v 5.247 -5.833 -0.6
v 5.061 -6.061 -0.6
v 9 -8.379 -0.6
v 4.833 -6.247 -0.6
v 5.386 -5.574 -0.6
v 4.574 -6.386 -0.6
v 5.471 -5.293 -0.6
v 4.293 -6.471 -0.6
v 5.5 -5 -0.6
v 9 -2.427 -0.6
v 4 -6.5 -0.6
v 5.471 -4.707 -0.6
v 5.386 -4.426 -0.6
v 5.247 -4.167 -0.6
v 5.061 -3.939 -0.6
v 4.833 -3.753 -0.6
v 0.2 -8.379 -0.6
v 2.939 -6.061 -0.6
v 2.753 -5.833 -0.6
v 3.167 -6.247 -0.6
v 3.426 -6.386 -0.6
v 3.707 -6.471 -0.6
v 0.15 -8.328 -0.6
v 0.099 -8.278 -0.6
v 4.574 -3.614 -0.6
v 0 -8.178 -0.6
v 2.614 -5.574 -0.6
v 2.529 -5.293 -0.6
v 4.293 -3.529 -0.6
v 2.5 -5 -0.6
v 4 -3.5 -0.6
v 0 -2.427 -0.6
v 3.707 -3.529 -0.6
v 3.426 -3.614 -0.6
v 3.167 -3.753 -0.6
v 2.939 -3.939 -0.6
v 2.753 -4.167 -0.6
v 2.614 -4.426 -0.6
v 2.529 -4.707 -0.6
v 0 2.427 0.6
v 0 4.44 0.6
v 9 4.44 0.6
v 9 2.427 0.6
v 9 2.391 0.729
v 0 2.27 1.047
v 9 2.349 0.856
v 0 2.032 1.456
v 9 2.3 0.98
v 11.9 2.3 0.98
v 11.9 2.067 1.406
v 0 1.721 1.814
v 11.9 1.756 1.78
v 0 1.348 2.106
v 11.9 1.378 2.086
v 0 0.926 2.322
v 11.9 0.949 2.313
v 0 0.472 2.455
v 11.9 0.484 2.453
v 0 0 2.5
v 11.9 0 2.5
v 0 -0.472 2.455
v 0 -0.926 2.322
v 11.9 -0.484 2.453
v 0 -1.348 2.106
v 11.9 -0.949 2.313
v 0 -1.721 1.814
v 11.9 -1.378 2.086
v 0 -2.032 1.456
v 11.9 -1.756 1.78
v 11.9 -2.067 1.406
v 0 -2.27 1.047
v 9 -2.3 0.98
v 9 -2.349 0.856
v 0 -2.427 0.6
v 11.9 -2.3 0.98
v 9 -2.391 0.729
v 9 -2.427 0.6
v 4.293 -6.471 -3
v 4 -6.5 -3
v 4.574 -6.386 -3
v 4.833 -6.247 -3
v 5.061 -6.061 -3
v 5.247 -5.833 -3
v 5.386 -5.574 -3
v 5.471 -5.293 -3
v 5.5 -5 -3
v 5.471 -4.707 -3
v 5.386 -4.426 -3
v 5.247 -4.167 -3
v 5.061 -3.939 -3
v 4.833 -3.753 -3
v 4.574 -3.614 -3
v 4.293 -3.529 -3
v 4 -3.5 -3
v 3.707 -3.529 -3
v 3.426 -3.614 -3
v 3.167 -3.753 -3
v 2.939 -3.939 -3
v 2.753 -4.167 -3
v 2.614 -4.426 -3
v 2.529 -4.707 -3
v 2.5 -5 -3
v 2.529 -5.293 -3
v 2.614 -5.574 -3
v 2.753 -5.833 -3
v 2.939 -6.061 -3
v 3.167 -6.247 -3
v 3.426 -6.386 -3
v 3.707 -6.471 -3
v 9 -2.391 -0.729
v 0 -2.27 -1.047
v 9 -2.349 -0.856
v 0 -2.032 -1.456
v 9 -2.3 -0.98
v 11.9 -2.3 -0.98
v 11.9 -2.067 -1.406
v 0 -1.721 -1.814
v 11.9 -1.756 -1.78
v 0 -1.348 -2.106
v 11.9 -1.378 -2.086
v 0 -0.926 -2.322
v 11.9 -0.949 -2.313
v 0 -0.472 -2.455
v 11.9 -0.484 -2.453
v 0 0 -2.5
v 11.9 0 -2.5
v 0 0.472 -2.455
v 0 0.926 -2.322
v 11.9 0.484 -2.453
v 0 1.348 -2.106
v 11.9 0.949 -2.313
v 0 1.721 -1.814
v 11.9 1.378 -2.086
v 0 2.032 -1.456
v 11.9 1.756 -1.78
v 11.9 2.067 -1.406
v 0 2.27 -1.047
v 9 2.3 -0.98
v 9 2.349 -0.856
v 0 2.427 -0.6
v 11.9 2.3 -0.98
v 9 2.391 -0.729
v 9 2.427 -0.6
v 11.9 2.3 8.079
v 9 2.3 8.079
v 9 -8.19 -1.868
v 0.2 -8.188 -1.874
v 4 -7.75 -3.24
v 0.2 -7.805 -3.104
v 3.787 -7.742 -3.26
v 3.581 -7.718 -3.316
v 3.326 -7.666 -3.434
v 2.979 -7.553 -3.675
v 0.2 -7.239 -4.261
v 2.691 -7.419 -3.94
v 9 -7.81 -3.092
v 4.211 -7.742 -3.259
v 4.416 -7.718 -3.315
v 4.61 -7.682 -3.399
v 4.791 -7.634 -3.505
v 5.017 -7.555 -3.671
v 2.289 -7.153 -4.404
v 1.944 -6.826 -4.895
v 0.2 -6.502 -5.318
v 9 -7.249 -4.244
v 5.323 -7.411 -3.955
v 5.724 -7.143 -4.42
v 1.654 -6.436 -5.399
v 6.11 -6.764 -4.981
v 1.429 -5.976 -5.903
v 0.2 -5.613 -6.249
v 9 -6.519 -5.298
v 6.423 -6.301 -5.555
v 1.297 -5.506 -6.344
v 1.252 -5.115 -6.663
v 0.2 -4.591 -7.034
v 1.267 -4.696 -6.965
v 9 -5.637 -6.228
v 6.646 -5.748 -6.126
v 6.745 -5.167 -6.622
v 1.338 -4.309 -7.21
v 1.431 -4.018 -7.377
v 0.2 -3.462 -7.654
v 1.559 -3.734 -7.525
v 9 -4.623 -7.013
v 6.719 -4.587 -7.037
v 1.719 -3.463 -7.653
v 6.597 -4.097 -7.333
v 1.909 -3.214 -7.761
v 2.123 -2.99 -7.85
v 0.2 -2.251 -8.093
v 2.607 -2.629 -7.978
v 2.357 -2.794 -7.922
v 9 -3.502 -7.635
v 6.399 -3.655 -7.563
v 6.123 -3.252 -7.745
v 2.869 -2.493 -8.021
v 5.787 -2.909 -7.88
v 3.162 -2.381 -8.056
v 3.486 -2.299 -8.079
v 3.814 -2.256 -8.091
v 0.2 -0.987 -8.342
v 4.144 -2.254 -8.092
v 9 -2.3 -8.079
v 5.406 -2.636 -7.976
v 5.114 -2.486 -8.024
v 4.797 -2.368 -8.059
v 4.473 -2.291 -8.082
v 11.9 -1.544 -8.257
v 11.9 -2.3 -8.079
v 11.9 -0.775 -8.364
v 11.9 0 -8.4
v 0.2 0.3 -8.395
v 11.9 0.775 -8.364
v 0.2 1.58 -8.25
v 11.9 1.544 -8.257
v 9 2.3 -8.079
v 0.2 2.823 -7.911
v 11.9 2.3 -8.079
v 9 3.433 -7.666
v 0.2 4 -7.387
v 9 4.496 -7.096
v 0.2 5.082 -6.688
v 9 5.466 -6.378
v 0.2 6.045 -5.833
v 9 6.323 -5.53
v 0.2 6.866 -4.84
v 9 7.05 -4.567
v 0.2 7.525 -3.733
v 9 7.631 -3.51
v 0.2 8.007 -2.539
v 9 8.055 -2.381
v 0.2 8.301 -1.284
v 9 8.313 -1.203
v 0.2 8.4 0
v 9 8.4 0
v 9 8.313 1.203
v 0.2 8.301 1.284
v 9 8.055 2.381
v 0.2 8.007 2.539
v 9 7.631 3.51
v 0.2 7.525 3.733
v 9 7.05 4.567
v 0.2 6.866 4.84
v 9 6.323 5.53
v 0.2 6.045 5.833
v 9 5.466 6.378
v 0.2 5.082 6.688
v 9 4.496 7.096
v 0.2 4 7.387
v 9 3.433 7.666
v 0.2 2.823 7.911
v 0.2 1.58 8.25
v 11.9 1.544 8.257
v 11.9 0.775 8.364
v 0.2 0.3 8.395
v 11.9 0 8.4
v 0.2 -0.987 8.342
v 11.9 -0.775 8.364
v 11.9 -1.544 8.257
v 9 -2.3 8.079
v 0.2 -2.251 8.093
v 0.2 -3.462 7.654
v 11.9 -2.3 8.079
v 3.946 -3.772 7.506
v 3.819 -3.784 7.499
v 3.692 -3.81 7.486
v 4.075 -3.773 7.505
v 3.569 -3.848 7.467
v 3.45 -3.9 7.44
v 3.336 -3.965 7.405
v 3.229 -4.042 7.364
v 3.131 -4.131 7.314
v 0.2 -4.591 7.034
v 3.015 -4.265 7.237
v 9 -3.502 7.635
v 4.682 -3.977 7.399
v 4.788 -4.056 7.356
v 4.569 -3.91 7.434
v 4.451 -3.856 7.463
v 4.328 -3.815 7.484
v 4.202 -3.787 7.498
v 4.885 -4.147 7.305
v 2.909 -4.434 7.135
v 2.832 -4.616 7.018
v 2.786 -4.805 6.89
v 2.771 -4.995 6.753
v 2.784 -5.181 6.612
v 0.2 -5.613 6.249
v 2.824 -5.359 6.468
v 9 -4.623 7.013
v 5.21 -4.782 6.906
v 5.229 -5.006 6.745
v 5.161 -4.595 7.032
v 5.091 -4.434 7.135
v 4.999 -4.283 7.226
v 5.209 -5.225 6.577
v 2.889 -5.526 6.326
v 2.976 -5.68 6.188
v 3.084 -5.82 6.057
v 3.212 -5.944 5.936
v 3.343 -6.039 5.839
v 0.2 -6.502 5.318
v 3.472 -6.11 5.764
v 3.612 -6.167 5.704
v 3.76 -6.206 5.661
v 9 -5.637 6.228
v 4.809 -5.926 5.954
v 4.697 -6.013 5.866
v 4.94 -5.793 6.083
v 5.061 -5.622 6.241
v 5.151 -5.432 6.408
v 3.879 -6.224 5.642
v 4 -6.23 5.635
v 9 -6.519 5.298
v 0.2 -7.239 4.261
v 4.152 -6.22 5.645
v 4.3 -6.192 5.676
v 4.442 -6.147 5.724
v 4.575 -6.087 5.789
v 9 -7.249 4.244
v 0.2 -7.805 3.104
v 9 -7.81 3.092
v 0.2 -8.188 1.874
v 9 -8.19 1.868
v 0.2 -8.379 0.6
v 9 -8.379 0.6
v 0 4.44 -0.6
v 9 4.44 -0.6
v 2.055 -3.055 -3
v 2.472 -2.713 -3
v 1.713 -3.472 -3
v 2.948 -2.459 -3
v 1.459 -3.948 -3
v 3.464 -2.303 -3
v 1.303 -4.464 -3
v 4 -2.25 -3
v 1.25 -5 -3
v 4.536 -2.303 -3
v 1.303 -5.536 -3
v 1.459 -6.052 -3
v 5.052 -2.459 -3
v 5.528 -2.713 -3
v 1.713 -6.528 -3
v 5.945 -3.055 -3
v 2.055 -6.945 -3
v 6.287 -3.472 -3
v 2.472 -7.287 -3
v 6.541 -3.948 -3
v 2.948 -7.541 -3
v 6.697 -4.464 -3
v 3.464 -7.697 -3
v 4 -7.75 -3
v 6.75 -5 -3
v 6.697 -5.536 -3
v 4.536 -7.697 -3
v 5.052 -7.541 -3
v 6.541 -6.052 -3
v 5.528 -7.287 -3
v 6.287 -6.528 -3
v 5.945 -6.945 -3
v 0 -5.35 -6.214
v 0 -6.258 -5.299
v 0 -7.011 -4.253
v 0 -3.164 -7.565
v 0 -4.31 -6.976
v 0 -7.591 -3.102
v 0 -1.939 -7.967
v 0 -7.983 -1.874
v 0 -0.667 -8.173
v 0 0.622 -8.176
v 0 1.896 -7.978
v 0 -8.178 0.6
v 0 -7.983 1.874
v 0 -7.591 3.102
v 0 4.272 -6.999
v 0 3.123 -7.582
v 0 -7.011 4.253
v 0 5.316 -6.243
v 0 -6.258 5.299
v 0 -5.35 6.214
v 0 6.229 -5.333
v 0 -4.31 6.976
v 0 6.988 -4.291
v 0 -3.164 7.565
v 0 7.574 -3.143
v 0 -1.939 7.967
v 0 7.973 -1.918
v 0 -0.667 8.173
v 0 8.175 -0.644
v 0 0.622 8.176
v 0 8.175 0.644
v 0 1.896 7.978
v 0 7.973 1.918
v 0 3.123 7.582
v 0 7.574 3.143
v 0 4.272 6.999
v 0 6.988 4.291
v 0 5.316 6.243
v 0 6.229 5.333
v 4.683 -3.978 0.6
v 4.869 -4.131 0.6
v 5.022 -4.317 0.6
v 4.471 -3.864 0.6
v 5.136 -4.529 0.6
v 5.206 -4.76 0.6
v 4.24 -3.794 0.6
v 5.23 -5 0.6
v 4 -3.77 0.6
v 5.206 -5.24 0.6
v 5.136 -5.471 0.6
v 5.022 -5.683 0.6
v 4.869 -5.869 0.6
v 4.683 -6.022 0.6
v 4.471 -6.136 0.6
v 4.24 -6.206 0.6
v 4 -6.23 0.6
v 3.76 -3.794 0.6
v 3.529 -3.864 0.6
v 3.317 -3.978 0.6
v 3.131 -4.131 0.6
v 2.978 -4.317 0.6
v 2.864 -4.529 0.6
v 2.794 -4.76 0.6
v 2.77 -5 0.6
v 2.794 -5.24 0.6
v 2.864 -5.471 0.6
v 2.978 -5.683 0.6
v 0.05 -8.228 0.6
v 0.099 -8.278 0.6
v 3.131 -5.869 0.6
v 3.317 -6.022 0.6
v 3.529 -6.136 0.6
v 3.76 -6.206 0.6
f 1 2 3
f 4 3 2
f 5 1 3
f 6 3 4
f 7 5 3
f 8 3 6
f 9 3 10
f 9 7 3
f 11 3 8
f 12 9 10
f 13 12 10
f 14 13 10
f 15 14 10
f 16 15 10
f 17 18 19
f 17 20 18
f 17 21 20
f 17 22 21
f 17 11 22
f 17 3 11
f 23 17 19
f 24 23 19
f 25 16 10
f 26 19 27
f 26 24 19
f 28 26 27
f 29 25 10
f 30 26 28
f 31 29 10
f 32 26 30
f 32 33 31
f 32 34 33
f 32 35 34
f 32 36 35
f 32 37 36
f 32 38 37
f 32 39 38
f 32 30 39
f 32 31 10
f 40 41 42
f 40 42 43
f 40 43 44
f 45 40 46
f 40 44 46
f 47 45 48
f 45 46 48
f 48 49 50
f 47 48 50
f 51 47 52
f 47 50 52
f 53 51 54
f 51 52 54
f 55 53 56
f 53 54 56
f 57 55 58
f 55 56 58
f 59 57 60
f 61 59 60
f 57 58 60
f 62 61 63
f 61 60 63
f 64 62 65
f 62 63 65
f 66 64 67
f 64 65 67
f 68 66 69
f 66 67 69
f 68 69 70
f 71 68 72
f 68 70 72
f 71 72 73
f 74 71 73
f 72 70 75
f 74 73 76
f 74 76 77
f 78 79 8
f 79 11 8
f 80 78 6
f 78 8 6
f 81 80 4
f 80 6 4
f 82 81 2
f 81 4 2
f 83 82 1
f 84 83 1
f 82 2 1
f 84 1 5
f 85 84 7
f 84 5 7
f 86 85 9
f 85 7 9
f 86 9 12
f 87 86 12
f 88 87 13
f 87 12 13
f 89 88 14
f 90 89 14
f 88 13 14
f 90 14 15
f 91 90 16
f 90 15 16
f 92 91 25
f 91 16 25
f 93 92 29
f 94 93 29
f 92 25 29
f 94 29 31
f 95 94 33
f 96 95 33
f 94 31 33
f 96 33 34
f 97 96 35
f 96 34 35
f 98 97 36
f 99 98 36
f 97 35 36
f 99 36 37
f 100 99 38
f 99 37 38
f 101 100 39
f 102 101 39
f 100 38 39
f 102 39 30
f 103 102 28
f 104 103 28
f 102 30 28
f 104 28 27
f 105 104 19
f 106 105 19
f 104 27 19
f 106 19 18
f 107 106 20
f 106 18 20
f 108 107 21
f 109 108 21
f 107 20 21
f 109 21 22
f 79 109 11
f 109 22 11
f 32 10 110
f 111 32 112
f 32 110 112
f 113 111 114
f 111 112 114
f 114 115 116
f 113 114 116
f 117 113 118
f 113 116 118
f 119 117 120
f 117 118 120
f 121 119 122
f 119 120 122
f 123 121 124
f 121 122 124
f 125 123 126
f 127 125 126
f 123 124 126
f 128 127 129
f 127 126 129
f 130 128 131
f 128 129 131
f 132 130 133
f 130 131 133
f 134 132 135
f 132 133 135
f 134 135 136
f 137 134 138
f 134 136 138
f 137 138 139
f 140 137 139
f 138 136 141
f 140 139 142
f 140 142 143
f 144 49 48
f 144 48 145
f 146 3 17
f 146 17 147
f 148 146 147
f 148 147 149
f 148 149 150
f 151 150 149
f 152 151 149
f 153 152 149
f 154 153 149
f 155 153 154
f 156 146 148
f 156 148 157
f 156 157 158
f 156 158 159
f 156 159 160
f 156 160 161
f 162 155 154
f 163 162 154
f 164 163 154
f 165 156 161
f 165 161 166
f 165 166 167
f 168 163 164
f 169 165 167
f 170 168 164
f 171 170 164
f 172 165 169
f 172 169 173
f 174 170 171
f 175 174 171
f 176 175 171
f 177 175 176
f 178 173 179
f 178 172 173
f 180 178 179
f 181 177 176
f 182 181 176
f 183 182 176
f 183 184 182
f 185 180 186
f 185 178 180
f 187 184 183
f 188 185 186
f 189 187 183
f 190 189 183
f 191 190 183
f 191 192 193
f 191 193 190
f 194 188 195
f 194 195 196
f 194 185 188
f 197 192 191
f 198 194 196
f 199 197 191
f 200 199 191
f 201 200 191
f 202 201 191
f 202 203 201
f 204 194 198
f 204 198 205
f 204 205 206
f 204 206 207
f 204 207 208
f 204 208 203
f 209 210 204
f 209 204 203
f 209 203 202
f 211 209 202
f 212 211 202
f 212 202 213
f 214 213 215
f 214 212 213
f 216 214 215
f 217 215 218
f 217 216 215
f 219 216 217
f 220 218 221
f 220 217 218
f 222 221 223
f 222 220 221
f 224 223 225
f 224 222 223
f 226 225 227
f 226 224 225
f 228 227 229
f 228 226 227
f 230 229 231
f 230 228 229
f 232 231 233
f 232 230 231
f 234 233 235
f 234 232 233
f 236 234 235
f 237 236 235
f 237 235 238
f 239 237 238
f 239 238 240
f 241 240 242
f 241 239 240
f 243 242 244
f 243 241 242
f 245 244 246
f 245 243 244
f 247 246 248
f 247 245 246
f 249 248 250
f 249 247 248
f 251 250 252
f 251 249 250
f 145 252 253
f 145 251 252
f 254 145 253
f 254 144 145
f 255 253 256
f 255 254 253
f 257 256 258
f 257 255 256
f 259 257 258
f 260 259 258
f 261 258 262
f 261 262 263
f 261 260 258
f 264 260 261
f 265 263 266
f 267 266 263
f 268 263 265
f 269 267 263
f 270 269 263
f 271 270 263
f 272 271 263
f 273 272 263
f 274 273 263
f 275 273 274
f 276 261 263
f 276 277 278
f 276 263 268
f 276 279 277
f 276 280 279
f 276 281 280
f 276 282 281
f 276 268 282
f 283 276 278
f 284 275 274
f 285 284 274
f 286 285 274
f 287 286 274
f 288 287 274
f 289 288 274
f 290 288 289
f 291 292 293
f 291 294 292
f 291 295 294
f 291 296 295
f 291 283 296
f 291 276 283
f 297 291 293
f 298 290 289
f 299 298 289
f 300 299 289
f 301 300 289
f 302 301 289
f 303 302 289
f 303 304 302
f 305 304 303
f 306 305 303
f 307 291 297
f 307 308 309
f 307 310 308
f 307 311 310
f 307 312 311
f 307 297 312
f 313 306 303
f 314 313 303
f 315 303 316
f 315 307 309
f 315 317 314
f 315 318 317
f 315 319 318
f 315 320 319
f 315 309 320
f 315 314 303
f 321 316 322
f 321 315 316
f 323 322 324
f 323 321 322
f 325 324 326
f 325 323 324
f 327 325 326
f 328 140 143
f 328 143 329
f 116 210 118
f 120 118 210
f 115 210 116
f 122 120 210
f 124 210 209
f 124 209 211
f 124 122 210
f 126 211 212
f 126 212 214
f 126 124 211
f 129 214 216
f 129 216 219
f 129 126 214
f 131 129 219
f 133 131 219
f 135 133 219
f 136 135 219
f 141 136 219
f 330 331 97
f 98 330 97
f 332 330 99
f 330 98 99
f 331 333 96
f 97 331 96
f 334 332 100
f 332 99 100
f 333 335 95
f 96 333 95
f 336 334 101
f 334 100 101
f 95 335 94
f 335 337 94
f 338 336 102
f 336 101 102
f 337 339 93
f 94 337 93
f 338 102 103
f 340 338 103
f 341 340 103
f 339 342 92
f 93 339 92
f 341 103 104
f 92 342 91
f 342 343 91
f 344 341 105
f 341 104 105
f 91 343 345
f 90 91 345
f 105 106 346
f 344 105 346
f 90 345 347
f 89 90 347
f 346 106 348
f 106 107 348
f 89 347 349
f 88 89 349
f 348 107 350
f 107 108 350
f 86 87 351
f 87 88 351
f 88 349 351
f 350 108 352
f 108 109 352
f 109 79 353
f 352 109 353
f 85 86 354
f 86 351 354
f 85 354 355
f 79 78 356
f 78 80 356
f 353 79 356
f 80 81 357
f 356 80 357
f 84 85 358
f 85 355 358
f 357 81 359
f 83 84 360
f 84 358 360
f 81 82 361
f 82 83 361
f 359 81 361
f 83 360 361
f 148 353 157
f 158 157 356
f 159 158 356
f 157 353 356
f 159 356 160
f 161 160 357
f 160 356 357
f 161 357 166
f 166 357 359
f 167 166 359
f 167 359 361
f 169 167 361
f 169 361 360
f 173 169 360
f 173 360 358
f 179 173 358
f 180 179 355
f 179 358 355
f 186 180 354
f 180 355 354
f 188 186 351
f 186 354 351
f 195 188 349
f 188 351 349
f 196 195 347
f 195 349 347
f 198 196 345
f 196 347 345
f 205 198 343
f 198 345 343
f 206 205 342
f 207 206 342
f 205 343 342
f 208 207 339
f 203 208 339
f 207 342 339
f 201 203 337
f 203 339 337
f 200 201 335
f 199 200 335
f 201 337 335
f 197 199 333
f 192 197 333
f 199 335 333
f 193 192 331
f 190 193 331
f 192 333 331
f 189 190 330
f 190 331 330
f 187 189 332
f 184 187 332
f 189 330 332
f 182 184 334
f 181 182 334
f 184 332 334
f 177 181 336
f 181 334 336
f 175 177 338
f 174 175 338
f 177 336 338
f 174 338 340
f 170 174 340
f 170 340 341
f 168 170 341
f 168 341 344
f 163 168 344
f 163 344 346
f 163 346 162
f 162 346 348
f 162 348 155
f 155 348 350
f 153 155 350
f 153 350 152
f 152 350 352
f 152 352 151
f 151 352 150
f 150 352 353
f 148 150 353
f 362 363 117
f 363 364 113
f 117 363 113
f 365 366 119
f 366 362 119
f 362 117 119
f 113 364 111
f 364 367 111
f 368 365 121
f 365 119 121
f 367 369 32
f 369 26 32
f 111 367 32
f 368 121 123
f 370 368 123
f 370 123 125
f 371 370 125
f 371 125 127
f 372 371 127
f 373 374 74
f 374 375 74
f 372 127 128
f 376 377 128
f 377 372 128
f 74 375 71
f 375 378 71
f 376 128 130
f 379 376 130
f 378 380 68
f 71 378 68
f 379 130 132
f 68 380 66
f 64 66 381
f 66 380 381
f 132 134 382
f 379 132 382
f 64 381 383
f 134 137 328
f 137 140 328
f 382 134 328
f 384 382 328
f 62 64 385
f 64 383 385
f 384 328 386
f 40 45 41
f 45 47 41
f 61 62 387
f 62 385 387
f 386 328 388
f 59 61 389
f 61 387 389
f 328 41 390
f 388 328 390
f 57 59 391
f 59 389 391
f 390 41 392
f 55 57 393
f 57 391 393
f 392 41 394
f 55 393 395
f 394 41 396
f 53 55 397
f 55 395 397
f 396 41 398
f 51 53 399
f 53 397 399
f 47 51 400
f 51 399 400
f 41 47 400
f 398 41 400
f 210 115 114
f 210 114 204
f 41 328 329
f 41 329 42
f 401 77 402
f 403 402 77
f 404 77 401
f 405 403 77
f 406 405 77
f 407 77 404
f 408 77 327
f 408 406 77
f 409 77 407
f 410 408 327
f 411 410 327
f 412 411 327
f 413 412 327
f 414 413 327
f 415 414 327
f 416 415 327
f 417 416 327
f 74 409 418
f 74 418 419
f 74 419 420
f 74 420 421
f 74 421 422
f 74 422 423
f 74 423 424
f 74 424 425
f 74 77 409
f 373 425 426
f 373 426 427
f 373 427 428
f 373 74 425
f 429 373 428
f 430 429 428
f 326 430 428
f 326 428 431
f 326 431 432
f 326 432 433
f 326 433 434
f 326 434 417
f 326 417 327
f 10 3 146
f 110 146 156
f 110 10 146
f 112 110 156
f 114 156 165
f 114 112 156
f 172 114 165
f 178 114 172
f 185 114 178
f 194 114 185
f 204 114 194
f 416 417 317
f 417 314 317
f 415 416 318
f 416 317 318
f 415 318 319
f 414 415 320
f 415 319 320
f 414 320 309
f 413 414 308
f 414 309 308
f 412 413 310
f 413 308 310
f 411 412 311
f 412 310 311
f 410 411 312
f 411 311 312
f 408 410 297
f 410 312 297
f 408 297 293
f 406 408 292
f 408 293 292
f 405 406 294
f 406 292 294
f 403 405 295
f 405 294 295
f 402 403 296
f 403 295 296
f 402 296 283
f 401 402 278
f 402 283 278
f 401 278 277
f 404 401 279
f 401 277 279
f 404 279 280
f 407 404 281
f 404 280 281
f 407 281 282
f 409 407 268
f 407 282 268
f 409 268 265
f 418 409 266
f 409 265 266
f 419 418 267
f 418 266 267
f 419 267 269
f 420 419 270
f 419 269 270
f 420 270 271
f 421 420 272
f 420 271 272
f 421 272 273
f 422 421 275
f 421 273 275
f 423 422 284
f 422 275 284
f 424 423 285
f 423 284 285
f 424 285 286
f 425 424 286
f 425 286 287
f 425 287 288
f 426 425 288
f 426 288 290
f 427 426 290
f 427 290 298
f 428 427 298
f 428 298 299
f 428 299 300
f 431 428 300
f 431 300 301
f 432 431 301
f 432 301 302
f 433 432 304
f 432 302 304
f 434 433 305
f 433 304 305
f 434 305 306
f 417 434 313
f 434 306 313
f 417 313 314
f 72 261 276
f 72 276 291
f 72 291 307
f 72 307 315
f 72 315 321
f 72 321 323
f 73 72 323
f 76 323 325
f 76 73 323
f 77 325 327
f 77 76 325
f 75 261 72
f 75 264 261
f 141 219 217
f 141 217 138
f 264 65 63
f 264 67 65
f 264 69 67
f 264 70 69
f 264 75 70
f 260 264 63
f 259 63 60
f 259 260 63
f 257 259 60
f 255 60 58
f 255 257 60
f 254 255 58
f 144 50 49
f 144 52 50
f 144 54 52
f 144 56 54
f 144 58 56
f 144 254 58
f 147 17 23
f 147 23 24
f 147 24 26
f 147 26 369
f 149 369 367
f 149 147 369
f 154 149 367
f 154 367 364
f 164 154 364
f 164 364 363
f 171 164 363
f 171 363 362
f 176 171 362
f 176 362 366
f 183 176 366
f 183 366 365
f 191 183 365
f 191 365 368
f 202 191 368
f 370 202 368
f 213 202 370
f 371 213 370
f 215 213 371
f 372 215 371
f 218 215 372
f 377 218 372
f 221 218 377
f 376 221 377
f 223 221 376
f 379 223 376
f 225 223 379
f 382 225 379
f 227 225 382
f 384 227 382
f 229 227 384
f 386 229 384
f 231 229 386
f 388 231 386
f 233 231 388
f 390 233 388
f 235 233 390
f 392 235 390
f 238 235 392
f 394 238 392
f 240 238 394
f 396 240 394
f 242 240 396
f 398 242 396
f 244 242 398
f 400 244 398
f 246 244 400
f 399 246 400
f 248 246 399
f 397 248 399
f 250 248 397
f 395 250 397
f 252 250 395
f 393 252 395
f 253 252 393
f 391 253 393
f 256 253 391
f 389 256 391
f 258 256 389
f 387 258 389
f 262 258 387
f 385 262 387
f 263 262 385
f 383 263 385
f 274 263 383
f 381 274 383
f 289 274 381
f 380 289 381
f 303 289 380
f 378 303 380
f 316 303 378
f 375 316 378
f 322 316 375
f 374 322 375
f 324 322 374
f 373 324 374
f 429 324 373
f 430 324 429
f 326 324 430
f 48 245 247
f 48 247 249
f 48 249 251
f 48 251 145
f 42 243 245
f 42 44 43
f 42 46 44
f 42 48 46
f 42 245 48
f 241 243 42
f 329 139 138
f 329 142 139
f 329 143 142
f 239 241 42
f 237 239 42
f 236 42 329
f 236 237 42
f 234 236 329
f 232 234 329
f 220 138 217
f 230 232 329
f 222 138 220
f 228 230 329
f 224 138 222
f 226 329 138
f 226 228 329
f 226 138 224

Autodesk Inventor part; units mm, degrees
sketch "Sketch_1" plane through (0, 0, 0) normal (0, 0, 1) x (1, 0, 0)
  line L0 (11.9, 0) -> (0, 0)
  line L1 (0, 0) -> (0, 8.2)
  line L2 (0, 8.2) -> (0.2, 8.4)
  line L3 (0.2, 8.4) -> (11.9, 8.4)
  line L4 (11.9, 8.4) -> (11.9, 0)
  line L5 (11.9, 0) -> (0, 0)
revolve "Revolution1" add sketch "Sketch_1" angle 360 about axis through (11.9, 0, 0) along (1, 0, 0)
sketch "Sketch_6" plane through (0, 0, 0) normal (1, 0, 0) x (0, 1, 0)
  line L0 (0, 0.6) -> (-8.4, 0.6)
  line L1 (-8.4, 0.6) -> (-8.4, -0.6)
  line L2 (-8.4, -0.6) -> (0, -0.6)
  line L3 (0, -0.6) -> (0, 0.6)
extrude "Extrusion1" cut sketch "Sketch_6" along normal blind 9
sketch "Sketch_7" plane through (4, 0, 0) normal (1, 0, 0) x (0, 0, -1)
  line L0 (-8.4, -5) -> (8.4, -5)
  line L1 (8.4, -5) -> (8.4, -7.75)
  line L2 (8.4, -7.75) -> (3, -7.75)
  line L3 (3, -7.75) -> (3, -6.5)
  line L4 (3, -6.5) -> (0.6, -6.5)
  line L5 (0.6, -6.5) -> (0.6, -5)
  line L6 (0.6, -5) -> (8.4, -5)
revolve "Revolution2" cut sketch "Sketch_7" angle 360 about axis through (4, -5, 8.4) along (0, 0, 1)
sketch "Sketch_13" plane through (4, 0, 0) normal (1, 0, 0) x (0, 0, -1)
  line L0 (-8.4, -5) -> (8.4, -5)
  line L1 (-0.6, -5) -> (-0.6, -6.2295)
  line L2 (-0.6, -6.2295) -> (-8.4, -6.2295)
  line L3 (-8.4, -6.2295) -> (-8.4, -5)
  line L4 (-8.4, -5) -> (-0.6, -5)
revolve "Revolution3" cut sketch "Sketch_13" angle 360 about axis through (4, -5, 8.4) along (0, 0, 1)
thread "Thread1" size "M3x0.5" class "6H" standard "ISO Metric profile" length 4.7207 offset 2.1855
sketch "Sketch_2" plane through (11.9, 0, 0) normal (1, 0, 0) x (0, 0, -1)
  line L0 (-9.4, 8.9) -> (-9.4, -8.9)
  line L1 (-9.4, -8.9) -> (9.4, -8.9)
  line L2 (9.4, -8.9) -> (9.4, 8.9)
  line L3 (9.4, 8.9) -> (-9.4, 8.9)
  line L4 (-8.4, 2.3) -> (-8.4, -2.3)
  line L5 (-8.4, -2.3) -> (8.4, -2.3)
  line L6 (8.4, -2.3) -> (8.4, 2.3)
  line L7 (8.4, 2.3) -> (-8.4, 2.3)
extrude "Extrusion2" cut sketch "Sketch_2" against normal blind 2.9
sketch "Sketch_3" plane through (0, 0, 0) normal (0, 0, 1) x (1, 0, 0)
  line L0 (11.9, 0) -> (0, 0)
  line L1 (0, 0) -> (0, 2.5)
  line L2 (0, 2.5) -> (11.9, 2.5)
  line L3 (11.9, 2.5) -> (11.9, 0)
  line L4 (11.9, 0) -> (0, 0)
revolve "Revolution4" cut sketch "Sketch_3" angle 360 about axis through (11.9, 0, 0) along (1, 0, 0)
sketch "Sketch_17" plane through (0, 0, 0) normal (1, 0, 0) x (0, 0, -1)
  line L0 (-0.6, 0) -> (0.6, 0)
  line L1 (0.6, 0) -> (0.6, 4.44)
  line L2 (0.6, 4.44) -> (-0.6, 4.44)
  line L3 (-0.6, 4.44) -> (-0.6, 0)
extrude "Extrusion3" cut sketch "Sketch_17" along normal blind 11.9
ref_plane "L_XY" through (12.2, 0, 0) normal (1, 0, 0) x (0, 0, -1)
ref_plane "L_YZ" through (12.2, 0, 0) normal (0, 0, -1) x (0, 1, 0)
ref_plane "L_ZX" through (12.2, 0, 0) normal (0, 1, 0) x (1, 0, 0)
ref_plane "screw_XY" through (4, -5, -3) normal (0, 0, -1) x (1, 0, 0)
ref_plane "screw_YZ" through (4, -5, -3) normal (1, 0, 0) x (0, -1, 0)
ref_plane "screw_ZX" through (4, -5, -3) normal (0, -1, 0) x (0, 0, -1)
properties part number "MCOC17-5_c"
